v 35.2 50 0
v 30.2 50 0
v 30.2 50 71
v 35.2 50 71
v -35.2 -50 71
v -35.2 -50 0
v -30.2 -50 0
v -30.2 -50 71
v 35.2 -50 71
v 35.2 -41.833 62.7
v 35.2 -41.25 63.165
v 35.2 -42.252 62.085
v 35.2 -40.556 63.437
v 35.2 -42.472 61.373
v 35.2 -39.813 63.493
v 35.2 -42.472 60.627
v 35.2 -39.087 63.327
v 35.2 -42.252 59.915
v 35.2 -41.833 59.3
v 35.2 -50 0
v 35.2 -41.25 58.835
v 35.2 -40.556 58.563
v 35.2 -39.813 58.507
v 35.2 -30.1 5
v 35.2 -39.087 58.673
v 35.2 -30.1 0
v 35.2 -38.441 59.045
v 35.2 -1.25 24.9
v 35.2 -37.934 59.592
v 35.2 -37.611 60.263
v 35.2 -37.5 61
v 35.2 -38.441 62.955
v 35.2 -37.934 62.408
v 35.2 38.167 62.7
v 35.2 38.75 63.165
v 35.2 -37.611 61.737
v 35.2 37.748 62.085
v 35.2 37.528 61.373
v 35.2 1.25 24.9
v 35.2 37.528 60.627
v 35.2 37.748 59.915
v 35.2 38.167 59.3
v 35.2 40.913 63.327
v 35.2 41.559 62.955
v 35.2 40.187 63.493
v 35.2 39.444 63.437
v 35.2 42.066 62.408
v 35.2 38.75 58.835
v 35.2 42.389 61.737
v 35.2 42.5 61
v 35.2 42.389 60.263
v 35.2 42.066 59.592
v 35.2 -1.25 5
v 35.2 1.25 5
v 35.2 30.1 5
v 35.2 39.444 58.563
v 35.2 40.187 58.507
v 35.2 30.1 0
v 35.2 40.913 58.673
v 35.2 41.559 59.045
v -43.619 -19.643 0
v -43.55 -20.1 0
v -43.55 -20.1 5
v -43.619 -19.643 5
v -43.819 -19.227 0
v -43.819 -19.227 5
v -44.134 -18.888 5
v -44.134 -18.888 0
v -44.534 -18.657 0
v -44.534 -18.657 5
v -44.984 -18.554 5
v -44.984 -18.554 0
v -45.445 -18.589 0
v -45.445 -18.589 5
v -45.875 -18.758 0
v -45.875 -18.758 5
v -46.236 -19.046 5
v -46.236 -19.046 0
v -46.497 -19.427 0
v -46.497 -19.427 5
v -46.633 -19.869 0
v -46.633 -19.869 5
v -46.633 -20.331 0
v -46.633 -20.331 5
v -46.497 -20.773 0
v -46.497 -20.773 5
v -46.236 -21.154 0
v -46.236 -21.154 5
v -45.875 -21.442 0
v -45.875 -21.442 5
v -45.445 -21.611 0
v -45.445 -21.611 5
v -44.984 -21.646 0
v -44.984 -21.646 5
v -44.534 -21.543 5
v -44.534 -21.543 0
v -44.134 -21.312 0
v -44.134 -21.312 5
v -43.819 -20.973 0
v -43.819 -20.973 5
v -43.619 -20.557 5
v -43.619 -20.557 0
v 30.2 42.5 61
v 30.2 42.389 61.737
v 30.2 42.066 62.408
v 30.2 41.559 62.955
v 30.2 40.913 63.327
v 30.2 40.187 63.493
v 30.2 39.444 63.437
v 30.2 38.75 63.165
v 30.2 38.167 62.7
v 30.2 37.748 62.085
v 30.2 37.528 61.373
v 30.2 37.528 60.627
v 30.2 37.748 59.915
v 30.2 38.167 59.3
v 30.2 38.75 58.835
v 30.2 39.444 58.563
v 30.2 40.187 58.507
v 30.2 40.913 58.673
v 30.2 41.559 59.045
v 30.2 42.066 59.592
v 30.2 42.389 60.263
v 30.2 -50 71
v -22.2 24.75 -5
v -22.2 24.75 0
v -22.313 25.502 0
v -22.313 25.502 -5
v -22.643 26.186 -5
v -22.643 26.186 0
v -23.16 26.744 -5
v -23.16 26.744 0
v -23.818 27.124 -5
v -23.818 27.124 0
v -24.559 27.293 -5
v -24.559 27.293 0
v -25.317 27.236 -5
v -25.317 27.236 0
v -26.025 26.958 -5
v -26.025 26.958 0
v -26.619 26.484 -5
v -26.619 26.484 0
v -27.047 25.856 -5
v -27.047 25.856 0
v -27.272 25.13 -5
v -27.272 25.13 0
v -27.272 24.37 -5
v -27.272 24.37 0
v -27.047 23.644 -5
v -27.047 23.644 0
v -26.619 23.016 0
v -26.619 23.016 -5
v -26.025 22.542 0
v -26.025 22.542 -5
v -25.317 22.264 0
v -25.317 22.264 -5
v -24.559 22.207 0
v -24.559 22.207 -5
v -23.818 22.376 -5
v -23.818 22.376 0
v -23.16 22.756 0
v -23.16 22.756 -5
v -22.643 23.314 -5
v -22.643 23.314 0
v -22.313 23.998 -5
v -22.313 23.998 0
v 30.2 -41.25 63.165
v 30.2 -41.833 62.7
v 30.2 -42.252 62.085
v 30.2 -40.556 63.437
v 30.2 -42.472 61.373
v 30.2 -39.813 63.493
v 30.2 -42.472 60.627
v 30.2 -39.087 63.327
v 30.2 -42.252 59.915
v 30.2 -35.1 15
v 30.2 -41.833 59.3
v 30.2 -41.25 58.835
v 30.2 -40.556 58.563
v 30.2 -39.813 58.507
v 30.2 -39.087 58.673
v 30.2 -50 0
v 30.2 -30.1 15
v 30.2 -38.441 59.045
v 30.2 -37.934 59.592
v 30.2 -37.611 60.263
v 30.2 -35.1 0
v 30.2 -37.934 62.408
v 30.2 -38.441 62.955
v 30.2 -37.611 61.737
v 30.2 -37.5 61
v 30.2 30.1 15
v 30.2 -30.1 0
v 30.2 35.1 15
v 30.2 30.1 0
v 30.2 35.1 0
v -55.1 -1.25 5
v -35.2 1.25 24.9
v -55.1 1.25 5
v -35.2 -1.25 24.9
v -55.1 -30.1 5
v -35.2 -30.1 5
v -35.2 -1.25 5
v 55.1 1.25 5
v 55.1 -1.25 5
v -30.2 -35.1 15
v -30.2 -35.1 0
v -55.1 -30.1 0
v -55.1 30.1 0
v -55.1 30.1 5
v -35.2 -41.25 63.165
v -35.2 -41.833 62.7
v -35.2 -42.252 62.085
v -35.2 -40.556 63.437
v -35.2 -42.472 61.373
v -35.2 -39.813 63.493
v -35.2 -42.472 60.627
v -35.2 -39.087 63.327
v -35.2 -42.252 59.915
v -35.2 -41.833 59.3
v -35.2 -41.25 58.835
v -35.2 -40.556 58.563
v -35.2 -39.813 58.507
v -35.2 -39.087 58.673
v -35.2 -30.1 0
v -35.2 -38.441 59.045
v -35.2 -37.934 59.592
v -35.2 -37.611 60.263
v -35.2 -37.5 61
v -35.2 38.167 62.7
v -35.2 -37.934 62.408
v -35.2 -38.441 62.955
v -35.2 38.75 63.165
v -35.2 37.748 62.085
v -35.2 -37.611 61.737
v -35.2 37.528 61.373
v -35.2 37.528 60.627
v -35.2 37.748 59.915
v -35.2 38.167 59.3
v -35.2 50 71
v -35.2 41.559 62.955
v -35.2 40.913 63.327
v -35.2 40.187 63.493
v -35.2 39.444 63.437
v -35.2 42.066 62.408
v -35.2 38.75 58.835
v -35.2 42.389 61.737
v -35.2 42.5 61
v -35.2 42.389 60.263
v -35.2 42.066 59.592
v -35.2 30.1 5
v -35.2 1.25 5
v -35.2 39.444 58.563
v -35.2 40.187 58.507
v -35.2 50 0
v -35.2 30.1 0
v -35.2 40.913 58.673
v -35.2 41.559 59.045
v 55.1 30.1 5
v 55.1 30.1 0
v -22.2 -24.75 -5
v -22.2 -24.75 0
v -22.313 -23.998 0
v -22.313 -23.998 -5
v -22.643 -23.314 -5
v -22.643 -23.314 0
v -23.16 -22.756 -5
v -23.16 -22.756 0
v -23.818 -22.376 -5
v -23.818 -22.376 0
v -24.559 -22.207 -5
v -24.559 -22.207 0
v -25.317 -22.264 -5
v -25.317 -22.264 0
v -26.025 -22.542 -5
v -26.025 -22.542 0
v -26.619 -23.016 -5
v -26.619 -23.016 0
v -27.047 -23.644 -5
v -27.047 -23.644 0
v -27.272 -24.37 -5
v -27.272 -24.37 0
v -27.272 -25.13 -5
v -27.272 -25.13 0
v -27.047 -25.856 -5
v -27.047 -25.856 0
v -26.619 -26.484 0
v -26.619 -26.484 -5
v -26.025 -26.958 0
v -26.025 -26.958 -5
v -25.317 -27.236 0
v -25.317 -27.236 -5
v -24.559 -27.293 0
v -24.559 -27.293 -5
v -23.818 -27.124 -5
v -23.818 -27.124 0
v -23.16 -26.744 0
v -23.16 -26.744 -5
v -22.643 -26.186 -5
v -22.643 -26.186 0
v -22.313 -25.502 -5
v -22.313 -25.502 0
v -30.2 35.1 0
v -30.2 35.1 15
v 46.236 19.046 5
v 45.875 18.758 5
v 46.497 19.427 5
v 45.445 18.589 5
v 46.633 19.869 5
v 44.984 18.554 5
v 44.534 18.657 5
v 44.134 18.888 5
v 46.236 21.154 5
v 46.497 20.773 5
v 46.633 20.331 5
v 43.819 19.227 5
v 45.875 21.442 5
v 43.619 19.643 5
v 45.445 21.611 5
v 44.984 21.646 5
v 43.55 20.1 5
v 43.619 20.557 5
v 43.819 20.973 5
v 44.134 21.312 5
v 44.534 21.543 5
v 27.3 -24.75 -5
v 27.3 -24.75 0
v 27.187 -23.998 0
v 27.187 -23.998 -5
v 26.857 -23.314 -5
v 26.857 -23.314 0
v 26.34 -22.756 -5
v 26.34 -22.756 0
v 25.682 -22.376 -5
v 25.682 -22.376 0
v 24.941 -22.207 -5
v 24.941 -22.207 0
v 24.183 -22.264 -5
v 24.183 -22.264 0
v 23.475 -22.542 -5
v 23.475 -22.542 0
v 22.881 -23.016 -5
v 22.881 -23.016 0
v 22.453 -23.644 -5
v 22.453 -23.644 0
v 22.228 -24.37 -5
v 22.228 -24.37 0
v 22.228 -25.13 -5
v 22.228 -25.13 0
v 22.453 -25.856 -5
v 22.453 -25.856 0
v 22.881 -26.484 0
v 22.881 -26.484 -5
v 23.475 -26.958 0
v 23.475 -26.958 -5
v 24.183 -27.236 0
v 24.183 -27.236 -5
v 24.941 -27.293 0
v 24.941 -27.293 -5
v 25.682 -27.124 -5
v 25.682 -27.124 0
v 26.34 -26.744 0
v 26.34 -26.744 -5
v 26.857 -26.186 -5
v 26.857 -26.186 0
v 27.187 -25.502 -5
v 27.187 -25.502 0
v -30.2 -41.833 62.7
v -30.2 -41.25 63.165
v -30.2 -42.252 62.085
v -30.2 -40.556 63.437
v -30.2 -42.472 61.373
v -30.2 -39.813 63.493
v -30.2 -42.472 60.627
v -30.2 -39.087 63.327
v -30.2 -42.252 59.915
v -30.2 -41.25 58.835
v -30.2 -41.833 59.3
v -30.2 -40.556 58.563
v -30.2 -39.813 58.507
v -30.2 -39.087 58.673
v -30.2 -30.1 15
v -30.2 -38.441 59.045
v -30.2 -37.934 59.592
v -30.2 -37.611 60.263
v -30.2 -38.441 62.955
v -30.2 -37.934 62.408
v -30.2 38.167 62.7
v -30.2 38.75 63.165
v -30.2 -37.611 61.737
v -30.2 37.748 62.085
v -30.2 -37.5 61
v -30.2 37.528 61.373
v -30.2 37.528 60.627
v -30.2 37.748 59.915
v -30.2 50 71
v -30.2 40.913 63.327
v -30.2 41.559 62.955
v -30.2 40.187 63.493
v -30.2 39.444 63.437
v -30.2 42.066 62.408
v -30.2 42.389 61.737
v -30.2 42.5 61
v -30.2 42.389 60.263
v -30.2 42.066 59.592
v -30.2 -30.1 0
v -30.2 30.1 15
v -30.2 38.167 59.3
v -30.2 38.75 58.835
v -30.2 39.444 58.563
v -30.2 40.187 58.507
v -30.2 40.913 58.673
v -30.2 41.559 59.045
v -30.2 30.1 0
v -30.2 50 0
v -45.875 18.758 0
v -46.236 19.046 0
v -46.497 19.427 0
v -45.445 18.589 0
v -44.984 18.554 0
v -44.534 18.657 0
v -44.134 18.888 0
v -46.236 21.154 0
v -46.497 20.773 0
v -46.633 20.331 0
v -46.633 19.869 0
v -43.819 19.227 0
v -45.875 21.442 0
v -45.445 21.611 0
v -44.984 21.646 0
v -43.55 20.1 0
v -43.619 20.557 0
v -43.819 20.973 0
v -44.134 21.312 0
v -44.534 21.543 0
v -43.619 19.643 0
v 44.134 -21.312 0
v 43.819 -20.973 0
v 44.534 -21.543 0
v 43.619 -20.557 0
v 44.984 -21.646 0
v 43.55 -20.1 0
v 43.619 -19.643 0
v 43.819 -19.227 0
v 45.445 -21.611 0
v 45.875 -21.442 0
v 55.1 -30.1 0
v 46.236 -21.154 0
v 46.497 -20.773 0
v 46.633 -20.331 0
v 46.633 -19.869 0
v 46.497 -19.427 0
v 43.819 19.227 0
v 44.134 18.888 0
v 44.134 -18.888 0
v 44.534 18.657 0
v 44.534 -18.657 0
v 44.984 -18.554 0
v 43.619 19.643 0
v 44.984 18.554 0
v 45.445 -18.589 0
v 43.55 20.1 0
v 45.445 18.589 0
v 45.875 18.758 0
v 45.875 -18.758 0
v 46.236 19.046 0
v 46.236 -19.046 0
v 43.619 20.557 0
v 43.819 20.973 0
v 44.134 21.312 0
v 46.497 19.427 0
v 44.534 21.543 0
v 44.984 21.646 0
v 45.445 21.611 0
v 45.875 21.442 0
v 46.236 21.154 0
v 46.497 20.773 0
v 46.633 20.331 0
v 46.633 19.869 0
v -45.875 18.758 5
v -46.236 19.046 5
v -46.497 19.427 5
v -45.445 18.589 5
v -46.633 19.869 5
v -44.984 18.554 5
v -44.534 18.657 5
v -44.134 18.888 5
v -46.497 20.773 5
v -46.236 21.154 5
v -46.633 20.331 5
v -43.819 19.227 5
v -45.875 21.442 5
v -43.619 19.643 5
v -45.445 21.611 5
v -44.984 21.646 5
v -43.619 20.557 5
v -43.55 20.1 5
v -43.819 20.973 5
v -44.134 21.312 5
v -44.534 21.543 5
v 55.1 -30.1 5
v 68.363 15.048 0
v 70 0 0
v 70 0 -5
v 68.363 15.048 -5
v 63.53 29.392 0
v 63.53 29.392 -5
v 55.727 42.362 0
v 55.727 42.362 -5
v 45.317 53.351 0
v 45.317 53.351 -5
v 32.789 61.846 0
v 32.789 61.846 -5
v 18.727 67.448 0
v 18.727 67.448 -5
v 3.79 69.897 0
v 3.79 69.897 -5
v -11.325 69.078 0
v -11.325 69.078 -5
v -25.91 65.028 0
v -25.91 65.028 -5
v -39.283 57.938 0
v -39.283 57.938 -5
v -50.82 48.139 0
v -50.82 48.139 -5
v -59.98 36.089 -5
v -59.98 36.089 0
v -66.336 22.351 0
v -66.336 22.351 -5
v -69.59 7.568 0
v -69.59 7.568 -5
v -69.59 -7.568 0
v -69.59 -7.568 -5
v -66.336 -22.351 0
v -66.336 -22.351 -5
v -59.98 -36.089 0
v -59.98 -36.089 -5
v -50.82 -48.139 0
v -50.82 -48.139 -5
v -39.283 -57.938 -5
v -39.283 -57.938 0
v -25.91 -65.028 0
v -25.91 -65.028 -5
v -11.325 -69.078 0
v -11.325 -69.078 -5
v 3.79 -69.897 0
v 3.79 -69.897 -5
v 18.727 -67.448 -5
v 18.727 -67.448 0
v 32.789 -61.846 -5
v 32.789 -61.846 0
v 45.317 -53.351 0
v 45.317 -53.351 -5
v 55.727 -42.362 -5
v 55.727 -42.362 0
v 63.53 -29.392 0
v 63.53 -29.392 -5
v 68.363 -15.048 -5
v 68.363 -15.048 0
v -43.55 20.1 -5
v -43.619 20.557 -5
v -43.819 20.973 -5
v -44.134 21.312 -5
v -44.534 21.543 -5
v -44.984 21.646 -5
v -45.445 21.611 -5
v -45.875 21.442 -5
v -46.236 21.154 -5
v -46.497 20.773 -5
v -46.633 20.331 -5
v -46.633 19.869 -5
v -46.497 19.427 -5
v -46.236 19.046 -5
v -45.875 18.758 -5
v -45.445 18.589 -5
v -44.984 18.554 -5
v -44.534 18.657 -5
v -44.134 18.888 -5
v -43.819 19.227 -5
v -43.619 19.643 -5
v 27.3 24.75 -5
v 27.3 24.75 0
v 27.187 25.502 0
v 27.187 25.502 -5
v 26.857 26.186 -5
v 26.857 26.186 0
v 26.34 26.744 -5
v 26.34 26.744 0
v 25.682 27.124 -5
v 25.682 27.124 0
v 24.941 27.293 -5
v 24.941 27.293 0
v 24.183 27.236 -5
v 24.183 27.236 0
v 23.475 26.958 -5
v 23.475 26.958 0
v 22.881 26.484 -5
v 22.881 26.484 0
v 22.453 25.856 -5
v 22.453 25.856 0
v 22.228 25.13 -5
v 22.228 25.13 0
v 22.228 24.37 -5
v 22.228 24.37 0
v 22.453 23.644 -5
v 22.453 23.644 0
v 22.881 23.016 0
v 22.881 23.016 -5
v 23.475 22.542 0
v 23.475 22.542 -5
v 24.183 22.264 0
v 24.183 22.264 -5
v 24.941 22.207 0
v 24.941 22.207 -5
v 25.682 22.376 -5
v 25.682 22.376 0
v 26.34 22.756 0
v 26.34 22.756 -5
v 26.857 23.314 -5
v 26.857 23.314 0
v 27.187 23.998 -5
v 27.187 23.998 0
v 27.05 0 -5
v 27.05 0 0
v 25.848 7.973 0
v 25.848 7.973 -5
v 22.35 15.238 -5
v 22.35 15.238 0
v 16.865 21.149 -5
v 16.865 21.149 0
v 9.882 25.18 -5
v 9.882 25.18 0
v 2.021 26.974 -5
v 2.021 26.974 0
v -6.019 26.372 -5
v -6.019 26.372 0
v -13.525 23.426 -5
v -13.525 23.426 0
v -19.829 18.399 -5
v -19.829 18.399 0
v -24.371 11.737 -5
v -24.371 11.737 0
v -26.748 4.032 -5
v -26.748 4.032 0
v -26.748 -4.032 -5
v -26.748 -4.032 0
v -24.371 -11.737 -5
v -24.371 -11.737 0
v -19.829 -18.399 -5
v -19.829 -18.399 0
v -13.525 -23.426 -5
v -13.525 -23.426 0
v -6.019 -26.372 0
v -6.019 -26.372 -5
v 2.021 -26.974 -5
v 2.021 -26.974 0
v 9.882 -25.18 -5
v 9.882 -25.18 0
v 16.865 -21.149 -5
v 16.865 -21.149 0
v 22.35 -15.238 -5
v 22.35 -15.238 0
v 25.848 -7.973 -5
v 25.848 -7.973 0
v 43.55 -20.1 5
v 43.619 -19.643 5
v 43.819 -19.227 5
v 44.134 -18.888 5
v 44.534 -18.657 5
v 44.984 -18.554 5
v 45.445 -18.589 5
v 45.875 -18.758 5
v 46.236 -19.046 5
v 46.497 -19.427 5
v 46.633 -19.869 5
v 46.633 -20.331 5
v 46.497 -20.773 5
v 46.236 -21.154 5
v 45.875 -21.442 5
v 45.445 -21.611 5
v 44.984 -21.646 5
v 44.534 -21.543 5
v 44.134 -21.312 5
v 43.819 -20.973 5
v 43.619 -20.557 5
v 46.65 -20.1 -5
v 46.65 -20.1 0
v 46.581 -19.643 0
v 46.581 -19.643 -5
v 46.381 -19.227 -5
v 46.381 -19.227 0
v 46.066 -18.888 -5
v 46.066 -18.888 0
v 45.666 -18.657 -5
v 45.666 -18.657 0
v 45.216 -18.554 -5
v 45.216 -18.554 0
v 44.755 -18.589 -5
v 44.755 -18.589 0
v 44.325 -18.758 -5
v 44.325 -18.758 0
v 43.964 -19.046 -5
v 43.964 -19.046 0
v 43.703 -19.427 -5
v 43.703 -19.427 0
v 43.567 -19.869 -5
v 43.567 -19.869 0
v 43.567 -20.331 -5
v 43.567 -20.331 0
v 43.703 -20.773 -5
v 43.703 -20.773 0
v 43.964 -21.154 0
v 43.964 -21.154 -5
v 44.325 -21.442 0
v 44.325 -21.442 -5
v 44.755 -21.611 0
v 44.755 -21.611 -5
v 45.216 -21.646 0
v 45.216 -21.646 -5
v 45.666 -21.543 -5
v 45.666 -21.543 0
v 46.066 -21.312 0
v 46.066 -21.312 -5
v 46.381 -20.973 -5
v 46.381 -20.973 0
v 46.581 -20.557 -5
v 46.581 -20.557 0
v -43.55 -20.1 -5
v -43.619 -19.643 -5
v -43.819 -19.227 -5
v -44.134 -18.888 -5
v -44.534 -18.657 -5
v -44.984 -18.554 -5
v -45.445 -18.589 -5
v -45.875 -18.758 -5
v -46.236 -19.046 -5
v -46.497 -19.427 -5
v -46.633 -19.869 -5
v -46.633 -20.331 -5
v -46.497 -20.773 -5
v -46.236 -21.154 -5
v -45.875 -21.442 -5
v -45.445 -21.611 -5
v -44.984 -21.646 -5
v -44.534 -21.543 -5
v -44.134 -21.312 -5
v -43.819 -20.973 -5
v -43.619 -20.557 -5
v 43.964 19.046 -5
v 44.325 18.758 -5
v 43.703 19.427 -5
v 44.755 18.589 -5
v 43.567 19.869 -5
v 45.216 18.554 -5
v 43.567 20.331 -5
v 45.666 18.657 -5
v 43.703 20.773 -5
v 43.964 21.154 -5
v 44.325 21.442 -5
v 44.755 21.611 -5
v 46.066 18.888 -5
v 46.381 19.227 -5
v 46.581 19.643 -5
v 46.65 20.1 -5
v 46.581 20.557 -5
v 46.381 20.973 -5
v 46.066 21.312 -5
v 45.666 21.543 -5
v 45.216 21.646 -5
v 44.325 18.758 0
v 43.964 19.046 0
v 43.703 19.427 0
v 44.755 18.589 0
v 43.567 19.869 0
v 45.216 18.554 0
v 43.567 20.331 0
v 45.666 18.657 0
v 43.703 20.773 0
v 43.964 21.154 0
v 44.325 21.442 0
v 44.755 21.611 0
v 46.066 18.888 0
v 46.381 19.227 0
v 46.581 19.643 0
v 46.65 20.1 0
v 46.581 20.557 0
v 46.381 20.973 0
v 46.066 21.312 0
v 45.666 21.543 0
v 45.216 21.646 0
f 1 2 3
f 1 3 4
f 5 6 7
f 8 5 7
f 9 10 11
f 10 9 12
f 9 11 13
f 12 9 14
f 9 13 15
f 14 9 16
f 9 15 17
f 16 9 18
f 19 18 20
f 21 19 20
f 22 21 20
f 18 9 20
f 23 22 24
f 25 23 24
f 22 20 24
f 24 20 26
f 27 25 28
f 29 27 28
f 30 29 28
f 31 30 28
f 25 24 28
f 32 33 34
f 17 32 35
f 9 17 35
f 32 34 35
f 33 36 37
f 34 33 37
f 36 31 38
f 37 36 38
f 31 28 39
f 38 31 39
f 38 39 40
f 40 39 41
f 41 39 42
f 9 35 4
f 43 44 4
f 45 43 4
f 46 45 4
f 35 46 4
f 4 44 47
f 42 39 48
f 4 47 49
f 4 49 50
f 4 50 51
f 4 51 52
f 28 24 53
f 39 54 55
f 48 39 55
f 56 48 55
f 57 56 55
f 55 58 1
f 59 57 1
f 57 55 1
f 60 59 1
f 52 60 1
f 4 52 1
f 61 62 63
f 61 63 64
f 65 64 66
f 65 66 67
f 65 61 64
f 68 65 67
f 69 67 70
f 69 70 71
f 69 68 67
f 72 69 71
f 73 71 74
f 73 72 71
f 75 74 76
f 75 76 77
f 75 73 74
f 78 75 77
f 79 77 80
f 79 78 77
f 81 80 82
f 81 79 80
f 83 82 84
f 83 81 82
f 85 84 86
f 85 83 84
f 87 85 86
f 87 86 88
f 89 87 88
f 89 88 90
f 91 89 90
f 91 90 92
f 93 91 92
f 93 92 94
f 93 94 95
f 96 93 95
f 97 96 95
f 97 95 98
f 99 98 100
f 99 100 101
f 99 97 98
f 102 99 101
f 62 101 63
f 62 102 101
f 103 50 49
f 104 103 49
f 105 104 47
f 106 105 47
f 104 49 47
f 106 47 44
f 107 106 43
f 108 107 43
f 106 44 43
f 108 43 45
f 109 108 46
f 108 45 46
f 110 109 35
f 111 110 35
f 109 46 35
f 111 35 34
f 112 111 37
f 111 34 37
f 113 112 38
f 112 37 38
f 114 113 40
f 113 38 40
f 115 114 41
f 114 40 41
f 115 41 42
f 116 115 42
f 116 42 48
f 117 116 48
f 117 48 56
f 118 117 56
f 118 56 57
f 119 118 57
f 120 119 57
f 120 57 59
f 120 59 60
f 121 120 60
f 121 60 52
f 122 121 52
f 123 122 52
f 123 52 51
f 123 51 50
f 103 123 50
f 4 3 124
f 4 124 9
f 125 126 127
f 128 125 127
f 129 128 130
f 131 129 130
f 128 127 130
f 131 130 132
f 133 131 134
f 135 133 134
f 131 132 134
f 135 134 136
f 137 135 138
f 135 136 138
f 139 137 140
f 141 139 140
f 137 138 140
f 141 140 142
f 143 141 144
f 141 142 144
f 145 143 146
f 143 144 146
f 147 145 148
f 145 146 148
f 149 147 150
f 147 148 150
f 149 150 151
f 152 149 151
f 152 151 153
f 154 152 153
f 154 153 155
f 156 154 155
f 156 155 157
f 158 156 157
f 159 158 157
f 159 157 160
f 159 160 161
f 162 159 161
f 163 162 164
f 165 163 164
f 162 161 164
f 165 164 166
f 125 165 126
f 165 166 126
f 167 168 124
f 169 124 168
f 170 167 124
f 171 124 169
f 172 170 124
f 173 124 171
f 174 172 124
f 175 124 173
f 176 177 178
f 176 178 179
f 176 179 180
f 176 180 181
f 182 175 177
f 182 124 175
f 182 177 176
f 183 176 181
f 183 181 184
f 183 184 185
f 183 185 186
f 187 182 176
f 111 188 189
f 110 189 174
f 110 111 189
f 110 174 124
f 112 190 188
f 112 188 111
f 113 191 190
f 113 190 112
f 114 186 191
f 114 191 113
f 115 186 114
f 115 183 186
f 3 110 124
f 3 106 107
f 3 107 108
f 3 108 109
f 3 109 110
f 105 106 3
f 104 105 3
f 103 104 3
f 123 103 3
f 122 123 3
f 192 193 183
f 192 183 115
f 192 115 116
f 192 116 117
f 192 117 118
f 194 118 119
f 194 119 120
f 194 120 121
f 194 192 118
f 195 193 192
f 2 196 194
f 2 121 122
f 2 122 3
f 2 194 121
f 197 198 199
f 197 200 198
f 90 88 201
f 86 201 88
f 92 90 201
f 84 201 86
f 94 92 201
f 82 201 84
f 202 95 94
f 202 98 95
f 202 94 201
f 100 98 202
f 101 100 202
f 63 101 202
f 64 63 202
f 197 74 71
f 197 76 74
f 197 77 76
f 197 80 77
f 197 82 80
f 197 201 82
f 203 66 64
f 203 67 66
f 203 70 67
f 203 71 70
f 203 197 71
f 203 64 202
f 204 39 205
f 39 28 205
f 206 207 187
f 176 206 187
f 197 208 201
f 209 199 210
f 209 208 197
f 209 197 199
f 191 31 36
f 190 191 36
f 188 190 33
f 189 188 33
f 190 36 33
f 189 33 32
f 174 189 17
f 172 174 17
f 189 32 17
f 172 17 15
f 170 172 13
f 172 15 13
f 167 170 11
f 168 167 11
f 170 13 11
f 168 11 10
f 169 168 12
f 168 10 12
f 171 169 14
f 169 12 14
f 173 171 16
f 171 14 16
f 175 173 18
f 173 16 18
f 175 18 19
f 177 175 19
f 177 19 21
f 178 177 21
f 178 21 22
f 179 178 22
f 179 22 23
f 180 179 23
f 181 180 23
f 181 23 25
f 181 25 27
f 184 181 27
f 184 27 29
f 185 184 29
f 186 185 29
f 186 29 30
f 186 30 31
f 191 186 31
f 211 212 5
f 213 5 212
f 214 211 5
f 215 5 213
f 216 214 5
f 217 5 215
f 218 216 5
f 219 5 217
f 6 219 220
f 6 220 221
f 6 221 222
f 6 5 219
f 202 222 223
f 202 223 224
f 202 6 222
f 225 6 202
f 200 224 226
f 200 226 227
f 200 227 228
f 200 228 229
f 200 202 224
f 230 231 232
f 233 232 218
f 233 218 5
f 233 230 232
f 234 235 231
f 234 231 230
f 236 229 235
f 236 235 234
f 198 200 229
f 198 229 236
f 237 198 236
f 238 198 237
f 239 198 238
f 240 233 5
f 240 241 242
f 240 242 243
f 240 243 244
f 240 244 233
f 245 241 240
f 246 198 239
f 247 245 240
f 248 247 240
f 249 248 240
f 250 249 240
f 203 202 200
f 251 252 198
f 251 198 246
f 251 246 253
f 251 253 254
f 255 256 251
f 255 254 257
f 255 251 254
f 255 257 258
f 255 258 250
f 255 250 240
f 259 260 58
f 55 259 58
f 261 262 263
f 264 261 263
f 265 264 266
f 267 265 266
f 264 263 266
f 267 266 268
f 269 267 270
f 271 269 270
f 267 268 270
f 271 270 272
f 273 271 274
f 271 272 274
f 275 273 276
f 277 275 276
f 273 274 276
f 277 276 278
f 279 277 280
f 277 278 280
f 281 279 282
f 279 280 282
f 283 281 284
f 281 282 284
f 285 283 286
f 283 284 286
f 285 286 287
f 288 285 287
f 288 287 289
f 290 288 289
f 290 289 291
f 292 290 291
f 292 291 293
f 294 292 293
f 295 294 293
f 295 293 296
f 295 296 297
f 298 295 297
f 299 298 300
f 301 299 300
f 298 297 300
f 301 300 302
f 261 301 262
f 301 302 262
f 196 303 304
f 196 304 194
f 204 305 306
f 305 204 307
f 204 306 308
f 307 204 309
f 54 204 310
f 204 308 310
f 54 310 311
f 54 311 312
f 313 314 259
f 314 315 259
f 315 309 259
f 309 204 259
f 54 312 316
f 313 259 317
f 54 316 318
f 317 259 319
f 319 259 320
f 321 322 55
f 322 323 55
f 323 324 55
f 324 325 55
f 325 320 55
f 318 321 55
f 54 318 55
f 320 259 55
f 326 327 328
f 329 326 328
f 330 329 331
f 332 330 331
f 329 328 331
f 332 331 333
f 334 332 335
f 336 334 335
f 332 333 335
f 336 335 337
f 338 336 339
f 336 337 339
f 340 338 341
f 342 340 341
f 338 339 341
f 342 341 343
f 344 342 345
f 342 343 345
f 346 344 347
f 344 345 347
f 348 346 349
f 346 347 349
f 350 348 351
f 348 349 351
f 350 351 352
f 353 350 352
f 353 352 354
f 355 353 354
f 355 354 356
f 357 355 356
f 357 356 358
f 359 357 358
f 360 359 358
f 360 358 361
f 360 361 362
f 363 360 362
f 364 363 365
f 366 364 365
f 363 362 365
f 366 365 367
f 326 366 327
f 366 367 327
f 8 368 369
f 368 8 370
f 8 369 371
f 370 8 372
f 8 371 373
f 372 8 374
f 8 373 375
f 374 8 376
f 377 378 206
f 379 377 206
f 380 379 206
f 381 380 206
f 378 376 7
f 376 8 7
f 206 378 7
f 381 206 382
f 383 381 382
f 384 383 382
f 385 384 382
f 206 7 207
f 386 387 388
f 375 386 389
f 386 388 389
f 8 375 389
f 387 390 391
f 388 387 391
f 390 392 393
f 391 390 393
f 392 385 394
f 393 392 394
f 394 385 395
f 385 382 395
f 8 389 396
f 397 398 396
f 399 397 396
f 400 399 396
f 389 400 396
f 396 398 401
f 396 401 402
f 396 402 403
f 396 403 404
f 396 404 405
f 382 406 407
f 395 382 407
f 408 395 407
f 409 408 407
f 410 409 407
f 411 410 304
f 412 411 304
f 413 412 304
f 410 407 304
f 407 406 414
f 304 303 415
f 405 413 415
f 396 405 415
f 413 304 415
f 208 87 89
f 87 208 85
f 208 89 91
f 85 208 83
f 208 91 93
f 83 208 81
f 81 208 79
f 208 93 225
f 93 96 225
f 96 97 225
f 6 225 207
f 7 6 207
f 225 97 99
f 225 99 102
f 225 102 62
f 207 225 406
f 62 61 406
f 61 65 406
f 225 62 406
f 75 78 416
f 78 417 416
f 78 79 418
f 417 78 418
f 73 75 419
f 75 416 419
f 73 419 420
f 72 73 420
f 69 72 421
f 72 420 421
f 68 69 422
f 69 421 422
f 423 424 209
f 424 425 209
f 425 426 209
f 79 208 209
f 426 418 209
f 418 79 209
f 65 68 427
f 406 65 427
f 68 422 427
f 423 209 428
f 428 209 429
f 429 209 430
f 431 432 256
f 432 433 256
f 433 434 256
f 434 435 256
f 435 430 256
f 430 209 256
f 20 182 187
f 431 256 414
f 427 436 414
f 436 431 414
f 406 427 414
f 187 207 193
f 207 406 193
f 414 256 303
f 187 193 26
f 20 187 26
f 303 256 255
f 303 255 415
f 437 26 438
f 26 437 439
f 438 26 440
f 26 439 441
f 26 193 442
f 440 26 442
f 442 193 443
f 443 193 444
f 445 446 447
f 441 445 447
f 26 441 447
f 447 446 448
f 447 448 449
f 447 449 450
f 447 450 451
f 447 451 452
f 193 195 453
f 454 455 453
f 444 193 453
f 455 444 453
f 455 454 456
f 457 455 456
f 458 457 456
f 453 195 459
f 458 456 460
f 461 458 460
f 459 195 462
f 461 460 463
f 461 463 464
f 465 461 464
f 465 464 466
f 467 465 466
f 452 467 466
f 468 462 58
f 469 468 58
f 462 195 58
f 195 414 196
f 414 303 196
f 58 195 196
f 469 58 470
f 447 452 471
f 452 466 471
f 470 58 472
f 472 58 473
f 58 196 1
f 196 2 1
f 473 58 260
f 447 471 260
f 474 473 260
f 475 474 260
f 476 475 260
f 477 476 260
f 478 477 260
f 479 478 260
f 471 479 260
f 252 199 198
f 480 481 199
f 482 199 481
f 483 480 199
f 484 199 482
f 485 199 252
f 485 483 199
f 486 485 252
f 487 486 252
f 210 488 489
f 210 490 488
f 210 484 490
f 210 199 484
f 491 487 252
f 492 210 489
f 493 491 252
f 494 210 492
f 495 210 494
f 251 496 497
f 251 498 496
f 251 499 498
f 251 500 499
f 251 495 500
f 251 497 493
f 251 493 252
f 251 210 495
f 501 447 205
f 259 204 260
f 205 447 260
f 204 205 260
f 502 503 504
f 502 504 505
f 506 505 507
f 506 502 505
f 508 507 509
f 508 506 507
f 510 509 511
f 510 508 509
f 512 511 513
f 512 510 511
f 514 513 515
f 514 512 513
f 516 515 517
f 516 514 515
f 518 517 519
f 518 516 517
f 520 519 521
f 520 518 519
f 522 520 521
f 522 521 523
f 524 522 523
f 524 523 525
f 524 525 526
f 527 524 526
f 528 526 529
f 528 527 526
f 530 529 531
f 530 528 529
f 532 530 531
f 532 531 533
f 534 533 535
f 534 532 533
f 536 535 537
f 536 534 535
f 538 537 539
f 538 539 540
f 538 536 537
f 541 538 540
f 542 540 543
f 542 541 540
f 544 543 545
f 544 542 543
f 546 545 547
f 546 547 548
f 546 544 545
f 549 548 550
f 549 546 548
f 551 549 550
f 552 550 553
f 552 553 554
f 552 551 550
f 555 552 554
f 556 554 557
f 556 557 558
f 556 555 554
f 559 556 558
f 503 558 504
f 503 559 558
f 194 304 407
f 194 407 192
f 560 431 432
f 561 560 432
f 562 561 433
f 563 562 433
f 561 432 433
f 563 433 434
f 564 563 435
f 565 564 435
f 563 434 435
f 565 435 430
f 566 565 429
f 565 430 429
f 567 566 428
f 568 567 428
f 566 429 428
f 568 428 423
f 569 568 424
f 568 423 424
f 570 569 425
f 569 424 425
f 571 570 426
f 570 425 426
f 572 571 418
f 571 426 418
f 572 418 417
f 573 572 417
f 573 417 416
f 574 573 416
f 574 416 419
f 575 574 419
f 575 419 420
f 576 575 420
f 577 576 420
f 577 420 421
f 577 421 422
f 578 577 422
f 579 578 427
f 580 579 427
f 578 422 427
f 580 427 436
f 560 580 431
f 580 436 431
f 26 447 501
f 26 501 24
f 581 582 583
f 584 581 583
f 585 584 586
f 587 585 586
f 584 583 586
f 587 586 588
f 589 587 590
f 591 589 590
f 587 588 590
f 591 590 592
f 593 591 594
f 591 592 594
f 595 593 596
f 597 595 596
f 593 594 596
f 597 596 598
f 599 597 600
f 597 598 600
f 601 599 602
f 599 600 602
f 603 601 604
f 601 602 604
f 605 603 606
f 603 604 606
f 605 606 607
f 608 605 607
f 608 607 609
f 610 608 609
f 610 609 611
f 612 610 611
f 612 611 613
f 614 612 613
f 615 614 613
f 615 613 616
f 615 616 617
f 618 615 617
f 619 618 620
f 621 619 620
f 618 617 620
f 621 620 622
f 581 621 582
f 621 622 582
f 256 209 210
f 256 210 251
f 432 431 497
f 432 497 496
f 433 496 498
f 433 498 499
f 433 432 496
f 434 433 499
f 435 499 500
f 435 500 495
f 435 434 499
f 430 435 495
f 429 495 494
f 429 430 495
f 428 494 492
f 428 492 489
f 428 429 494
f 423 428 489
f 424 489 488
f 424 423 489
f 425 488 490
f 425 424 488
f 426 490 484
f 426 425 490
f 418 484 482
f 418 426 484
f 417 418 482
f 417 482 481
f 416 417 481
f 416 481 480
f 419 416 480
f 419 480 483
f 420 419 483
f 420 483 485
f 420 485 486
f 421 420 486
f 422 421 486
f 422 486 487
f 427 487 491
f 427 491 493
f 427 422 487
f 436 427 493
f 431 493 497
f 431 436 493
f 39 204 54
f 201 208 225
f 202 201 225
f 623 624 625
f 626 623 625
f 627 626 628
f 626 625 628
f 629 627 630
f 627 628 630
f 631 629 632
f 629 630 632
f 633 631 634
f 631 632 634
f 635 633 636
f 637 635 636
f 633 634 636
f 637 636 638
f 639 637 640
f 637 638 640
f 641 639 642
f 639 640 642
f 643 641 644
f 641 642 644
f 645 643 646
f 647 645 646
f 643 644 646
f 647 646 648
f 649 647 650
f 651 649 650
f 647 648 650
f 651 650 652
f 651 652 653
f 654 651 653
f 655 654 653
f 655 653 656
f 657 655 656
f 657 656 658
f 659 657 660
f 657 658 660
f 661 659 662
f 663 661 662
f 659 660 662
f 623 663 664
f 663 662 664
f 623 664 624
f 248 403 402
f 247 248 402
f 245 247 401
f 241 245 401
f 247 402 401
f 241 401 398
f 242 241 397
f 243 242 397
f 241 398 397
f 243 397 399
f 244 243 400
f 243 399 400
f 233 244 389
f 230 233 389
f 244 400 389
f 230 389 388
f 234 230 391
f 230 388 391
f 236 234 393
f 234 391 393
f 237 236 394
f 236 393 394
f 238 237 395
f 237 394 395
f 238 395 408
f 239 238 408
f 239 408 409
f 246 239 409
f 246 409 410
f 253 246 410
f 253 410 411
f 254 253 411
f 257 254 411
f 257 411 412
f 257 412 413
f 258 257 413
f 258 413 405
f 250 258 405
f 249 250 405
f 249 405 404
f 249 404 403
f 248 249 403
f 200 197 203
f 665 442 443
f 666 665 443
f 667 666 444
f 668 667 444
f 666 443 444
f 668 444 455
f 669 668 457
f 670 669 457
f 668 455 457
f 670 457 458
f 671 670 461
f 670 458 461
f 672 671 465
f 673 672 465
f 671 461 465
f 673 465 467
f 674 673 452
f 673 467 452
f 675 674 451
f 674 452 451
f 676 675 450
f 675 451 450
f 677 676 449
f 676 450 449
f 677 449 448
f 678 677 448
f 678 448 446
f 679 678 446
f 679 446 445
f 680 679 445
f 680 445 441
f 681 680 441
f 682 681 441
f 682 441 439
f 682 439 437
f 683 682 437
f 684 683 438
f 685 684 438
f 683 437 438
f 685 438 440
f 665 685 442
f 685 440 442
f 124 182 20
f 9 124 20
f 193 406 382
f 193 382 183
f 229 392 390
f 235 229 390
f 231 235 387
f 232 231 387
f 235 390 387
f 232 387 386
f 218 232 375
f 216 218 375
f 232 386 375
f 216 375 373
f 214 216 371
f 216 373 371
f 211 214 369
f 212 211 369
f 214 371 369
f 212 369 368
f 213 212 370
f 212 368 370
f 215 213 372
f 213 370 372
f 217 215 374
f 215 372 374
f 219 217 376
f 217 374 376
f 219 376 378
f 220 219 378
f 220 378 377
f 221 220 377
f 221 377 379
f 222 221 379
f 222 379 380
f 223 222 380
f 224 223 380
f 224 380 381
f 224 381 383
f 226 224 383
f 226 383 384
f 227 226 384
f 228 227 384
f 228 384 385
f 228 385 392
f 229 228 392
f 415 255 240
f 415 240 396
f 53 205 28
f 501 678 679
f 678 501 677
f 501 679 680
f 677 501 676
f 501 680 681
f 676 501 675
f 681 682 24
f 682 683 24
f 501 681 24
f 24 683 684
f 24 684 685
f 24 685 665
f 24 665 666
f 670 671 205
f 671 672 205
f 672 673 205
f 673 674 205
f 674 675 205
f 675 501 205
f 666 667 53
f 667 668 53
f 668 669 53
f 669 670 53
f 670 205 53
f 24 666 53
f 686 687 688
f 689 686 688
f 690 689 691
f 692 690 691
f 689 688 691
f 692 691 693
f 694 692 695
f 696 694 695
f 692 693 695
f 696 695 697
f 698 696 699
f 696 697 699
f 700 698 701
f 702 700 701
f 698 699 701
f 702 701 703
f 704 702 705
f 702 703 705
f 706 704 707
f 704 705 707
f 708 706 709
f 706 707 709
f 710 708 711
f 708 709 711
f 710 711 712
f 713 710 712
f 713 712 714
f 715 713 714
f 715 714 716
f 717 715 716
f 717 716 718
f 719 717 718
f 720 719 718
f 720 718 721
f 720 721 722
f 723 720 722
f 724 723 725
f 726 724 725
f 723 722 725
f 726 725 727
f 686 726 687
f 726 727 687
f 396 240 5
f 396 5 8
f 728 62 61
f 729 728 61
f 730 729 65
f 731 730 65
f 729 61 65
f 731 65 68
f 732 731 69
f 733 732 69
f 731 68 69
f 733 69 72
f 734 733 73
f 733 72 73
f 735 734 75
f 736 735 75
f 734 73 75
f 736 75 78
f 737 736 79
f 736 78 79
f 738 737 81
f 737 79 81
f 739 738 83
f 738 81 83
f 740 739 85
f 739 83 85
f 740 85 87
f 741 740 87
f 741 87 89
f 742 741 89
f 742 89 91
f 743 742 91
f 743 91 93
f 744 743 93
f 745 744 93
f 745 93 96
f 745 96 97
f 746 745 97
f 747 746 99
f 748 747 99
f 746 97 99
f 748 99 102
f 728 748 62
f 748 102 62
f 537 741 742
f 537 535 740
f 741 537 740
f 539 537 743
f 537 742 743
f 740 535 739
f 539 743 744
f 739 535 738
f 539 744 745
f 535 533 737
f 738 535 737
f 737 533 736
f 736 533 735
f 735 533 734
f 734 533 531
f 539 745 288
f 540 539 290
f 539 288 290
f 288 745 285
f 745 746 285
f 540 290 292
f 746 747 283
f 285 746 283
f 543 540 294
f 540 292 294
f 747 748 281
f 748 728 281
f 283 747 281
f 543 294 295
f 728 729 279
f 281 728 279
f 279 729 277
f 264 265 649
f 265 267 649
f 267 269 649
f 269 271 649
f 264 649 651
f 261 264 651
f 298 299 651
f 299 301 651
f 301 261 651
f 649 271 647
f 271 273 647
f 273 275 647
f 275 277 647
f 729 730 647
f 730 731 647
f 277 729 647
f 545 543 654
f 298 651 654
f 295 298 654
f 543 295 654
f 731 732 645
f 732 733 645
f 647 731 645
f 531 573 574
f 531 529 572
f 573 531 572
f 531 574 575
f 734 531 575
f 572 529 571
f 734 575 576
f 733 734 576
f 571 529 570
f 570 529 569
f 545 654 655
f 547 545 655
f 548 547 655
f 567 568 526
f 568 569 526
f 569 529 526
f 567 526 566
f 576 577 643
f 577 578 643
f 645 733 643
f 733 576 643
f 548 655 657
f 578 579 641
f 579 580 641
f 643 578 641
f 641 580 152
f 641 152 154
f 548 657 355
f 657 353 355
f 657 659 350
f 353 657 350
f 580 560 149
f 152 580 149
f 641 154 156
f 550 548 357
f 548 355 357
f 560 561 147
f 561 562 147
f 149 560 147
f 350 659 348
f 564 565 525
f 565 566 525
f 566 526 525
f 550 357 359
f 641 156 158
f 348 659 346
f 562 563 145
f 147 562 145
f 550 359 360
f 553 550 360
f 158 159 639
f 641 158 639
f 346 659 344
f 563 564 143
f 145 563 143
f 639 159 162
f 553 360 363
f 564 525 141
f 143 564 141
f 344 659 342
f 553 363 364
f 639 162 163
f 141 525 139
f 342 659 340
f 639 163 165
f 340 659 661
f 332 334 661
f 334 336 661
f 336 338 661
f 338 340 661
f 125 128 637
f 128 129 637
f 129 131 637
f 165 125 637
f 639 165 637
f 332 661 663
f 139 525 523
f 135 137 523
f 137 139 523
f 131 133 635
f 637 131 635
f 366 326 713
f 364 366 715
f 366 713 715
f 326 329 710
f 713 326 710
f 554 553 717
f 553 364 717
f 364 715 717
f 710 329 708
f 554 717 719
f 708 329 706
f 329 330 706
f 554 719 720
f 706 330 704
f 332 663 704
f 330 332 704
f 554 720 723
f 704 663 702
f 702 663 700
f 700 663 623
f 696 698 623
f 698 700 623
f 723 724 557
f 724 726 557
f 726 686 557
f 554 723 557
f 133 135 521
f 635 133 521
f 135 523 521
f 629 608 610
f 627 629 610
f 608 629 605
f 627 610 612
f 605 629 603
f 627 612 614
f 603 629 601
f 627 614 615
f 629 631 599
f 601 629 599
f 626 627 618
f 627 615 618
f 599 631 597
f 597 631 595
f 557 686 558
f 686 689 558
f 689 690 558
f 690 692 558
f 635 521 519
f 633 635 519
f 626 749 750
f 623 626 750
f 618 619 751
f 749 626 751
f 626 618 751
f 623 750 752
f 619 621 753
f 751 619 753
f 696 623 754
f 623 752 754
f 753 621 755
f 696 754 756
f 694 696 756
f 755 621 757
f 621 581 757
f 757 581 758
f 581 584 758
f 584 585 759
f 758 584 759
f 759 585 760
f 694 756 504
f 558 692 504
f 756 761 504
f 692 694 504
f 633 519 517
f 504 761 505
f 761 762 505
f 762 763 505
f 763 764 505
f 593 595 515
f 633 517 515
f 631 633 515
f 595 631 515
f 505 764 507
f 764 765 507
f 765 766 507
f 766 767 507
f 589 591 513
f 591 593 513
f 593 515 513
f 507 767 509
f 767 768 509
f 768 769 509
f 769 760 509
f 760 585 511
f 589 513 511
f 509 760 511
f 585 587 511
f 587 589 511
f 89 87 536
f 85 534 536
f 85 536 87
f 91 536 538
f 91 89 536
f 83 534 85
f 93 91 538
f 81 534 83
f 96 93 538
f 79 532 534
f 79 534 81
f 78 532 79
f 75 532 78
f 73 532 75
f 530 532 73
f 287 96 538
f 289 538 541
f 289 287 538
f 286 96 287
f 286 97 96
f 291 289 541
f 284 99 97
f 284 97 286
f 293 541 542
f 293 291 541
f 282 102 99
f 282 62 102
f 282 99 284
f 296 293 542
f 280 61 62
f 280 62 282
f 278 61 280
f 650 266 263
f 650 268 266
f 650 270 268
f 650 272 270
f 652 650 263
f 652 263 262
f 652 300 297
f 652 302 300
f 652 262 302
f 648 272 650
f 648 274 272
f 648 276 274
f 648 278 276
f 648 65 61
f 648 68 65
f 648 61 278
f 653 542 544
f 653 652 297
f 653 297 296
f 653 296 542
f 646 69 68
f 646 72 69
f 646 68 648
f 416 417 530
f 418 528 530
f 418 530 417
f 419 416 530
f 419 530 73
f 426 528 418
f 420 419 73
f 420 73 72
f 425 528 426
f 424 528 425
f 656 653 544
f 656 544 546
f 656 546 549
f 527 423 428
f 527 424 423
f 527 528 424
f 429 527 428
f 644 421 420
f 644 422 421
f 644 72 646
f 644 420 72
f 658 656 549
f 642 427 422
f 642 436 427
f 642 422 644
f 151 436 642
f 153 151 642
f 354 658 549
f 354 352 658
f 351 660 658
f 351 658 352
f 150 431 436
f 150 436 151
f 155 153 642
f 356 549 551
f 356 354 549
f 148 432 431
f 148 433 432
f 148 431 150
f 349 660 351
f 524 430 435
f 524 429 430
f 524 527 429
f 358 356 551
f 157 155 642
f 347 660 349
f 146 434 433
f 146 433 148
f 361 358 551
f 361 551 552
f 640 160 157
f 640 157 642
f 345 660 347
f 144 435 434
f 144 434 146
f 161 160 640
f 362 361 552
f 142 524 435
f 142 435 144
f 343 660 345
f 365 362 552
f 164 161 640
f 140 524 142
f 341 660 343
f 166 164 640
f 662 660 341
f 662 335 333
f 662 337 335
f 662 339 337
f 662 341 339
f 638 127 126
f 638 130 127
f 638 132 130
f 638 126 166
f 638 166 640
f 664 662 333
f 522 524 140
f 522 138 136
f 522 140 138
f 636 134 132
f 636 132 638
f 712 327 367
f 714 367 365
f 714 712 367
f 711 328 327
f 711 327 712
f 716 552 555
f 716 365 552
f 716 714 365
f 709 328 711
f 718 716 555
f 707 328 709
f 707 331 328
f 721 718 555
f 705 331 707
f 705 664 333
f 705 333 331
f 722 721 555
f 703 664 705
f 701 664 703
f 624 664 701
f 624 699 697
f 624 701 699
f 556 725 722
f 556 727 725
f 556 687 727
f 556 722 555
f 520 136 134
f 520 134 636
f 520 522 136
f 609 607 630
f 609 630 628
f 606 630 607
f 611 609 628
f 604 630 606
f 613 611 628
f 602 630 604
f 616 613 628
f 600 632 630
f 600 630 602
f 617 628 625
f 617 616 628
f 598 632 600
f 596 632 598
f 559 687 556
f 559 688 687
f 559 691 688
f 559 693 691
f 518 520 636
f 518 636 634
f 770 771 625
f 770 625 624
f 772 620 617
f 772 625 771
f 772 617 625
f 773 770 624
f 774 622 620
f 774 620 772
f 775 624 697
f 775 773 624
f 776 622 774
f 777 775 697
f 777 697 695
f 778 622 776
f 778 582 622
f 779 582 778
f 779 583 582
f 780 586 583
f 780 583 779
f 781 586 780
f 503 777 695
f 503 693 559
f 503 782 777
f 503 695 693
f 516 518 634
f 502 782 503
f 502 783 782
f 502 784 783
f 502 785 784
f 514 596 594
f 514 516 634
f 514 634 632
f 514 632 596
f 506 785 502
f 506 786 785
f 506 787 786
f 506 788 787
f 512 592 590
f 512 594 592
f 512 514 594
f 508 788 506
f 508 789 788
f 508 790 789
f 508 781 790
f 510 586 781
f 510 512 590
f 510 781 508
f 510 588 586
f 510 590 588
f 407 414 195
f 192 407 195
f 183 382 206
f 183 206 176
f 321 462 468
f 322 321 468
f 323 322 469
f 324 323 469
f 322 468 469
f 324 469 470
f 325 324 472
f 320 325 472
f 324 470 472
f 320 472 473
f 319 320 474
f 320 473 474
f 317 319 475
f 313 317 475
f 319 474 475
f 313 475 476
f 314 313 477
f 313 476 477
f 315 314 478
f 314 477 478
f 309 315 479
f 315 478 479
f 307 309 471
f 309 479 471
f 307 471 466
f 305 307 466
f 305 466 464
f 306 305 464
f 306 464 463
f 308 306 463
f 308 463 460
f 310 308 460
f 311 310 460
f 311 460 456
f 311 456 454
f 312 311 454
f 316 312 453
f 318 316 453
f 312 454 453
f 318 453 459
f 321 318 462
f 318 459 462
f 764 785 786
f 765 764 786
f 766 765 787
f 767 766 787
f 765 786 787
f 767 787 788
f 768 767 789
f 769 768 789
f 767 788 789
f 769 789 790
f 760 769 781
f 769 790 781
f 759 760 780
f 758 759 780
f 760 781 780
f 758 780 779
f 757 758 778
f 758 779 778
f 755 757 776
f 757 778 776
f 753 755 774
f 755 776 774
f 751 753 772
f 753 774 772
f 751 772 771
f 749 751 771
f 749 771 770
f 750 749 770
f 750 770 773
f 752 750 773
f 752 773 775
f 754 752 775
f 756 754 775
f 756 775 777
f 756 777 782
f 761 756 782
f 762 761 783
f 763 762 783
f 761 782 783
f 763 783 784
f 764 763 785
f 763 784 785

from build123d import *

# Parameters (mm, degrees)
F1_W      = 20
F1_H      = 60.2
F1_R      = 1.55
F2_DEPTH  = 5
F4_W      = 5
F4_H      = 100
F5_DEPTH  = 71
F6_R      = 2.5
F7_DEPTH  = 90.301
F8_W      = 60.4
F8_H      = 5
F9_DEPTH  = 15
F11_DEPTH = 1.25
F13_R     = 70
F13_R_2   = 1.55
F13_R_3   = 2.55
F13_R_4   = 27.05
F14_DEPTH = 5


with BuildPart() as f2:
    # F1 (on Top) → F2 (new body)
    with BuildSketch(Plane.XY):
        with Locations((-45.1, 0)):
            Rectangle(F1_W, F1_H)
        with Locations((-45.1, -20.1)):
            Circle(F1_R, mode=Mode.SUBTRACT)
        with Locations((-45.1, 20.1)):
            Circle(F1_R, mode=Mode.SUBTRACT)
    extrude(amount=F2_DEPTH)



with BuildPart() as f5:
    # F4 (on Top) → F5 (new body)
    with BuildSketch(Plane.XY):
        with Locations((32.7, 0)):
            Rectangle(F4_W, F4_H)
    extrude(amount=F5_DEPTH)


with BuildPart() as f5b:
    # F4 (on Top) → F5, piece 2 (new body)
    with BuildSketch(Plane.XY):
        with Locations((-32.7, 0)):
            Rectangle(F4_W, F4_H)
    extrude(amount=F5_DEPTH)


with BuildPart() as f7_tool:
    # F6 (on face) → F7 (new body, through all)
    with BuildSketch(Plane.YZ.offset(35.2)):
        with Locations((-40, 61)):
            Circle(F6_R)
        with Locations((40, 61)):
            Circle(F6_R)
    extrude(amount=-F7_DEPTH)


with BuildPart() as f5_1:
    add(f5.part)

    # F7: cut by f7_tool
    add(f7_tool.part, mode=Mode.SUBTRACT)



with BuildPart() as f5b_1:
    add(f5b.part)

    # F7: cut by f7_tool
    add(f7_tool.part, mode=Mode.SUBTRACT)


with BuildPart() as f5_2:
    add(f5_1.part)

    add(f5b_1.part)  # F9 merges F5b
    # F8 (on Top) → F9 (join)
    with BuildSketch(Plane.XY):
        with Locations((0, 32.6)):
            Rectangle(F8_W, F8_H)
        with Locations((0, -32.6)):
            Rectangle(F8_W, F8_H)
    extrude(amount=F9_DEPTH)


with BuildPart() as f2_1:
    add(f2.part)

    add(f5_2.part)  # F11 merges F5
    # F10 (on Front) → F11 (join, symmetric)
    with BuildSketch(Plane.XZ):
        Polygon((-35.2, 24.9), (-55.1, 5), (-35.2, 5), align=None)
    extrude(amount=F11_DEPTH, both=True)

    # F12: F2 across plane


with BuildPart() as f2_2:
    add(f2_1.part)
    add(f2_1.part.mirror(Plane.YZ))


with BuildPart() as f14:
    # F13 (on Top) → F14 (new body)
    with BuildSketch(Plane.XY):
        Circle(F13_R)
        with Locations((-45.1, -20.1)):
            Circle(F13_R_2, mode=Mode.SUBTRACT)
        with Locations((-24.75, -24.75)):
            Circle(F13_R_3, mode=Mode.SUBTRACT)
        with Locations((24.75, -24.75)):
            Circle(F13_R_3, mode=Mode.SUBTRACT)
        with Locations((45.1, -20.1)):
            Circle(F13_R_2, mode=Mode.SUBTRACT)
        with Locations((-45.1, 20.1)):
            Circle(F13_R_2, mode=Mode.SUBTRACT)
        with Locations((-24.75, 24.75)):
            Circle(F13_R_3, mode=Mode.SUBTRACT)
        Circle(F13_R_4, mode=Mode.SUBTRACT)
        with Locations((24.75, 24.75)):
            Circle(F13_R_3, mode=Mode.SUBTRACT)
        with Locations((45.1, 20.1)):
            Circle(F13_R_2, mode=Mode.SUBTRACT)
    extrude(amount=-F14_DEPTH)


solid = Compound([f2_2.part, f14.part])
